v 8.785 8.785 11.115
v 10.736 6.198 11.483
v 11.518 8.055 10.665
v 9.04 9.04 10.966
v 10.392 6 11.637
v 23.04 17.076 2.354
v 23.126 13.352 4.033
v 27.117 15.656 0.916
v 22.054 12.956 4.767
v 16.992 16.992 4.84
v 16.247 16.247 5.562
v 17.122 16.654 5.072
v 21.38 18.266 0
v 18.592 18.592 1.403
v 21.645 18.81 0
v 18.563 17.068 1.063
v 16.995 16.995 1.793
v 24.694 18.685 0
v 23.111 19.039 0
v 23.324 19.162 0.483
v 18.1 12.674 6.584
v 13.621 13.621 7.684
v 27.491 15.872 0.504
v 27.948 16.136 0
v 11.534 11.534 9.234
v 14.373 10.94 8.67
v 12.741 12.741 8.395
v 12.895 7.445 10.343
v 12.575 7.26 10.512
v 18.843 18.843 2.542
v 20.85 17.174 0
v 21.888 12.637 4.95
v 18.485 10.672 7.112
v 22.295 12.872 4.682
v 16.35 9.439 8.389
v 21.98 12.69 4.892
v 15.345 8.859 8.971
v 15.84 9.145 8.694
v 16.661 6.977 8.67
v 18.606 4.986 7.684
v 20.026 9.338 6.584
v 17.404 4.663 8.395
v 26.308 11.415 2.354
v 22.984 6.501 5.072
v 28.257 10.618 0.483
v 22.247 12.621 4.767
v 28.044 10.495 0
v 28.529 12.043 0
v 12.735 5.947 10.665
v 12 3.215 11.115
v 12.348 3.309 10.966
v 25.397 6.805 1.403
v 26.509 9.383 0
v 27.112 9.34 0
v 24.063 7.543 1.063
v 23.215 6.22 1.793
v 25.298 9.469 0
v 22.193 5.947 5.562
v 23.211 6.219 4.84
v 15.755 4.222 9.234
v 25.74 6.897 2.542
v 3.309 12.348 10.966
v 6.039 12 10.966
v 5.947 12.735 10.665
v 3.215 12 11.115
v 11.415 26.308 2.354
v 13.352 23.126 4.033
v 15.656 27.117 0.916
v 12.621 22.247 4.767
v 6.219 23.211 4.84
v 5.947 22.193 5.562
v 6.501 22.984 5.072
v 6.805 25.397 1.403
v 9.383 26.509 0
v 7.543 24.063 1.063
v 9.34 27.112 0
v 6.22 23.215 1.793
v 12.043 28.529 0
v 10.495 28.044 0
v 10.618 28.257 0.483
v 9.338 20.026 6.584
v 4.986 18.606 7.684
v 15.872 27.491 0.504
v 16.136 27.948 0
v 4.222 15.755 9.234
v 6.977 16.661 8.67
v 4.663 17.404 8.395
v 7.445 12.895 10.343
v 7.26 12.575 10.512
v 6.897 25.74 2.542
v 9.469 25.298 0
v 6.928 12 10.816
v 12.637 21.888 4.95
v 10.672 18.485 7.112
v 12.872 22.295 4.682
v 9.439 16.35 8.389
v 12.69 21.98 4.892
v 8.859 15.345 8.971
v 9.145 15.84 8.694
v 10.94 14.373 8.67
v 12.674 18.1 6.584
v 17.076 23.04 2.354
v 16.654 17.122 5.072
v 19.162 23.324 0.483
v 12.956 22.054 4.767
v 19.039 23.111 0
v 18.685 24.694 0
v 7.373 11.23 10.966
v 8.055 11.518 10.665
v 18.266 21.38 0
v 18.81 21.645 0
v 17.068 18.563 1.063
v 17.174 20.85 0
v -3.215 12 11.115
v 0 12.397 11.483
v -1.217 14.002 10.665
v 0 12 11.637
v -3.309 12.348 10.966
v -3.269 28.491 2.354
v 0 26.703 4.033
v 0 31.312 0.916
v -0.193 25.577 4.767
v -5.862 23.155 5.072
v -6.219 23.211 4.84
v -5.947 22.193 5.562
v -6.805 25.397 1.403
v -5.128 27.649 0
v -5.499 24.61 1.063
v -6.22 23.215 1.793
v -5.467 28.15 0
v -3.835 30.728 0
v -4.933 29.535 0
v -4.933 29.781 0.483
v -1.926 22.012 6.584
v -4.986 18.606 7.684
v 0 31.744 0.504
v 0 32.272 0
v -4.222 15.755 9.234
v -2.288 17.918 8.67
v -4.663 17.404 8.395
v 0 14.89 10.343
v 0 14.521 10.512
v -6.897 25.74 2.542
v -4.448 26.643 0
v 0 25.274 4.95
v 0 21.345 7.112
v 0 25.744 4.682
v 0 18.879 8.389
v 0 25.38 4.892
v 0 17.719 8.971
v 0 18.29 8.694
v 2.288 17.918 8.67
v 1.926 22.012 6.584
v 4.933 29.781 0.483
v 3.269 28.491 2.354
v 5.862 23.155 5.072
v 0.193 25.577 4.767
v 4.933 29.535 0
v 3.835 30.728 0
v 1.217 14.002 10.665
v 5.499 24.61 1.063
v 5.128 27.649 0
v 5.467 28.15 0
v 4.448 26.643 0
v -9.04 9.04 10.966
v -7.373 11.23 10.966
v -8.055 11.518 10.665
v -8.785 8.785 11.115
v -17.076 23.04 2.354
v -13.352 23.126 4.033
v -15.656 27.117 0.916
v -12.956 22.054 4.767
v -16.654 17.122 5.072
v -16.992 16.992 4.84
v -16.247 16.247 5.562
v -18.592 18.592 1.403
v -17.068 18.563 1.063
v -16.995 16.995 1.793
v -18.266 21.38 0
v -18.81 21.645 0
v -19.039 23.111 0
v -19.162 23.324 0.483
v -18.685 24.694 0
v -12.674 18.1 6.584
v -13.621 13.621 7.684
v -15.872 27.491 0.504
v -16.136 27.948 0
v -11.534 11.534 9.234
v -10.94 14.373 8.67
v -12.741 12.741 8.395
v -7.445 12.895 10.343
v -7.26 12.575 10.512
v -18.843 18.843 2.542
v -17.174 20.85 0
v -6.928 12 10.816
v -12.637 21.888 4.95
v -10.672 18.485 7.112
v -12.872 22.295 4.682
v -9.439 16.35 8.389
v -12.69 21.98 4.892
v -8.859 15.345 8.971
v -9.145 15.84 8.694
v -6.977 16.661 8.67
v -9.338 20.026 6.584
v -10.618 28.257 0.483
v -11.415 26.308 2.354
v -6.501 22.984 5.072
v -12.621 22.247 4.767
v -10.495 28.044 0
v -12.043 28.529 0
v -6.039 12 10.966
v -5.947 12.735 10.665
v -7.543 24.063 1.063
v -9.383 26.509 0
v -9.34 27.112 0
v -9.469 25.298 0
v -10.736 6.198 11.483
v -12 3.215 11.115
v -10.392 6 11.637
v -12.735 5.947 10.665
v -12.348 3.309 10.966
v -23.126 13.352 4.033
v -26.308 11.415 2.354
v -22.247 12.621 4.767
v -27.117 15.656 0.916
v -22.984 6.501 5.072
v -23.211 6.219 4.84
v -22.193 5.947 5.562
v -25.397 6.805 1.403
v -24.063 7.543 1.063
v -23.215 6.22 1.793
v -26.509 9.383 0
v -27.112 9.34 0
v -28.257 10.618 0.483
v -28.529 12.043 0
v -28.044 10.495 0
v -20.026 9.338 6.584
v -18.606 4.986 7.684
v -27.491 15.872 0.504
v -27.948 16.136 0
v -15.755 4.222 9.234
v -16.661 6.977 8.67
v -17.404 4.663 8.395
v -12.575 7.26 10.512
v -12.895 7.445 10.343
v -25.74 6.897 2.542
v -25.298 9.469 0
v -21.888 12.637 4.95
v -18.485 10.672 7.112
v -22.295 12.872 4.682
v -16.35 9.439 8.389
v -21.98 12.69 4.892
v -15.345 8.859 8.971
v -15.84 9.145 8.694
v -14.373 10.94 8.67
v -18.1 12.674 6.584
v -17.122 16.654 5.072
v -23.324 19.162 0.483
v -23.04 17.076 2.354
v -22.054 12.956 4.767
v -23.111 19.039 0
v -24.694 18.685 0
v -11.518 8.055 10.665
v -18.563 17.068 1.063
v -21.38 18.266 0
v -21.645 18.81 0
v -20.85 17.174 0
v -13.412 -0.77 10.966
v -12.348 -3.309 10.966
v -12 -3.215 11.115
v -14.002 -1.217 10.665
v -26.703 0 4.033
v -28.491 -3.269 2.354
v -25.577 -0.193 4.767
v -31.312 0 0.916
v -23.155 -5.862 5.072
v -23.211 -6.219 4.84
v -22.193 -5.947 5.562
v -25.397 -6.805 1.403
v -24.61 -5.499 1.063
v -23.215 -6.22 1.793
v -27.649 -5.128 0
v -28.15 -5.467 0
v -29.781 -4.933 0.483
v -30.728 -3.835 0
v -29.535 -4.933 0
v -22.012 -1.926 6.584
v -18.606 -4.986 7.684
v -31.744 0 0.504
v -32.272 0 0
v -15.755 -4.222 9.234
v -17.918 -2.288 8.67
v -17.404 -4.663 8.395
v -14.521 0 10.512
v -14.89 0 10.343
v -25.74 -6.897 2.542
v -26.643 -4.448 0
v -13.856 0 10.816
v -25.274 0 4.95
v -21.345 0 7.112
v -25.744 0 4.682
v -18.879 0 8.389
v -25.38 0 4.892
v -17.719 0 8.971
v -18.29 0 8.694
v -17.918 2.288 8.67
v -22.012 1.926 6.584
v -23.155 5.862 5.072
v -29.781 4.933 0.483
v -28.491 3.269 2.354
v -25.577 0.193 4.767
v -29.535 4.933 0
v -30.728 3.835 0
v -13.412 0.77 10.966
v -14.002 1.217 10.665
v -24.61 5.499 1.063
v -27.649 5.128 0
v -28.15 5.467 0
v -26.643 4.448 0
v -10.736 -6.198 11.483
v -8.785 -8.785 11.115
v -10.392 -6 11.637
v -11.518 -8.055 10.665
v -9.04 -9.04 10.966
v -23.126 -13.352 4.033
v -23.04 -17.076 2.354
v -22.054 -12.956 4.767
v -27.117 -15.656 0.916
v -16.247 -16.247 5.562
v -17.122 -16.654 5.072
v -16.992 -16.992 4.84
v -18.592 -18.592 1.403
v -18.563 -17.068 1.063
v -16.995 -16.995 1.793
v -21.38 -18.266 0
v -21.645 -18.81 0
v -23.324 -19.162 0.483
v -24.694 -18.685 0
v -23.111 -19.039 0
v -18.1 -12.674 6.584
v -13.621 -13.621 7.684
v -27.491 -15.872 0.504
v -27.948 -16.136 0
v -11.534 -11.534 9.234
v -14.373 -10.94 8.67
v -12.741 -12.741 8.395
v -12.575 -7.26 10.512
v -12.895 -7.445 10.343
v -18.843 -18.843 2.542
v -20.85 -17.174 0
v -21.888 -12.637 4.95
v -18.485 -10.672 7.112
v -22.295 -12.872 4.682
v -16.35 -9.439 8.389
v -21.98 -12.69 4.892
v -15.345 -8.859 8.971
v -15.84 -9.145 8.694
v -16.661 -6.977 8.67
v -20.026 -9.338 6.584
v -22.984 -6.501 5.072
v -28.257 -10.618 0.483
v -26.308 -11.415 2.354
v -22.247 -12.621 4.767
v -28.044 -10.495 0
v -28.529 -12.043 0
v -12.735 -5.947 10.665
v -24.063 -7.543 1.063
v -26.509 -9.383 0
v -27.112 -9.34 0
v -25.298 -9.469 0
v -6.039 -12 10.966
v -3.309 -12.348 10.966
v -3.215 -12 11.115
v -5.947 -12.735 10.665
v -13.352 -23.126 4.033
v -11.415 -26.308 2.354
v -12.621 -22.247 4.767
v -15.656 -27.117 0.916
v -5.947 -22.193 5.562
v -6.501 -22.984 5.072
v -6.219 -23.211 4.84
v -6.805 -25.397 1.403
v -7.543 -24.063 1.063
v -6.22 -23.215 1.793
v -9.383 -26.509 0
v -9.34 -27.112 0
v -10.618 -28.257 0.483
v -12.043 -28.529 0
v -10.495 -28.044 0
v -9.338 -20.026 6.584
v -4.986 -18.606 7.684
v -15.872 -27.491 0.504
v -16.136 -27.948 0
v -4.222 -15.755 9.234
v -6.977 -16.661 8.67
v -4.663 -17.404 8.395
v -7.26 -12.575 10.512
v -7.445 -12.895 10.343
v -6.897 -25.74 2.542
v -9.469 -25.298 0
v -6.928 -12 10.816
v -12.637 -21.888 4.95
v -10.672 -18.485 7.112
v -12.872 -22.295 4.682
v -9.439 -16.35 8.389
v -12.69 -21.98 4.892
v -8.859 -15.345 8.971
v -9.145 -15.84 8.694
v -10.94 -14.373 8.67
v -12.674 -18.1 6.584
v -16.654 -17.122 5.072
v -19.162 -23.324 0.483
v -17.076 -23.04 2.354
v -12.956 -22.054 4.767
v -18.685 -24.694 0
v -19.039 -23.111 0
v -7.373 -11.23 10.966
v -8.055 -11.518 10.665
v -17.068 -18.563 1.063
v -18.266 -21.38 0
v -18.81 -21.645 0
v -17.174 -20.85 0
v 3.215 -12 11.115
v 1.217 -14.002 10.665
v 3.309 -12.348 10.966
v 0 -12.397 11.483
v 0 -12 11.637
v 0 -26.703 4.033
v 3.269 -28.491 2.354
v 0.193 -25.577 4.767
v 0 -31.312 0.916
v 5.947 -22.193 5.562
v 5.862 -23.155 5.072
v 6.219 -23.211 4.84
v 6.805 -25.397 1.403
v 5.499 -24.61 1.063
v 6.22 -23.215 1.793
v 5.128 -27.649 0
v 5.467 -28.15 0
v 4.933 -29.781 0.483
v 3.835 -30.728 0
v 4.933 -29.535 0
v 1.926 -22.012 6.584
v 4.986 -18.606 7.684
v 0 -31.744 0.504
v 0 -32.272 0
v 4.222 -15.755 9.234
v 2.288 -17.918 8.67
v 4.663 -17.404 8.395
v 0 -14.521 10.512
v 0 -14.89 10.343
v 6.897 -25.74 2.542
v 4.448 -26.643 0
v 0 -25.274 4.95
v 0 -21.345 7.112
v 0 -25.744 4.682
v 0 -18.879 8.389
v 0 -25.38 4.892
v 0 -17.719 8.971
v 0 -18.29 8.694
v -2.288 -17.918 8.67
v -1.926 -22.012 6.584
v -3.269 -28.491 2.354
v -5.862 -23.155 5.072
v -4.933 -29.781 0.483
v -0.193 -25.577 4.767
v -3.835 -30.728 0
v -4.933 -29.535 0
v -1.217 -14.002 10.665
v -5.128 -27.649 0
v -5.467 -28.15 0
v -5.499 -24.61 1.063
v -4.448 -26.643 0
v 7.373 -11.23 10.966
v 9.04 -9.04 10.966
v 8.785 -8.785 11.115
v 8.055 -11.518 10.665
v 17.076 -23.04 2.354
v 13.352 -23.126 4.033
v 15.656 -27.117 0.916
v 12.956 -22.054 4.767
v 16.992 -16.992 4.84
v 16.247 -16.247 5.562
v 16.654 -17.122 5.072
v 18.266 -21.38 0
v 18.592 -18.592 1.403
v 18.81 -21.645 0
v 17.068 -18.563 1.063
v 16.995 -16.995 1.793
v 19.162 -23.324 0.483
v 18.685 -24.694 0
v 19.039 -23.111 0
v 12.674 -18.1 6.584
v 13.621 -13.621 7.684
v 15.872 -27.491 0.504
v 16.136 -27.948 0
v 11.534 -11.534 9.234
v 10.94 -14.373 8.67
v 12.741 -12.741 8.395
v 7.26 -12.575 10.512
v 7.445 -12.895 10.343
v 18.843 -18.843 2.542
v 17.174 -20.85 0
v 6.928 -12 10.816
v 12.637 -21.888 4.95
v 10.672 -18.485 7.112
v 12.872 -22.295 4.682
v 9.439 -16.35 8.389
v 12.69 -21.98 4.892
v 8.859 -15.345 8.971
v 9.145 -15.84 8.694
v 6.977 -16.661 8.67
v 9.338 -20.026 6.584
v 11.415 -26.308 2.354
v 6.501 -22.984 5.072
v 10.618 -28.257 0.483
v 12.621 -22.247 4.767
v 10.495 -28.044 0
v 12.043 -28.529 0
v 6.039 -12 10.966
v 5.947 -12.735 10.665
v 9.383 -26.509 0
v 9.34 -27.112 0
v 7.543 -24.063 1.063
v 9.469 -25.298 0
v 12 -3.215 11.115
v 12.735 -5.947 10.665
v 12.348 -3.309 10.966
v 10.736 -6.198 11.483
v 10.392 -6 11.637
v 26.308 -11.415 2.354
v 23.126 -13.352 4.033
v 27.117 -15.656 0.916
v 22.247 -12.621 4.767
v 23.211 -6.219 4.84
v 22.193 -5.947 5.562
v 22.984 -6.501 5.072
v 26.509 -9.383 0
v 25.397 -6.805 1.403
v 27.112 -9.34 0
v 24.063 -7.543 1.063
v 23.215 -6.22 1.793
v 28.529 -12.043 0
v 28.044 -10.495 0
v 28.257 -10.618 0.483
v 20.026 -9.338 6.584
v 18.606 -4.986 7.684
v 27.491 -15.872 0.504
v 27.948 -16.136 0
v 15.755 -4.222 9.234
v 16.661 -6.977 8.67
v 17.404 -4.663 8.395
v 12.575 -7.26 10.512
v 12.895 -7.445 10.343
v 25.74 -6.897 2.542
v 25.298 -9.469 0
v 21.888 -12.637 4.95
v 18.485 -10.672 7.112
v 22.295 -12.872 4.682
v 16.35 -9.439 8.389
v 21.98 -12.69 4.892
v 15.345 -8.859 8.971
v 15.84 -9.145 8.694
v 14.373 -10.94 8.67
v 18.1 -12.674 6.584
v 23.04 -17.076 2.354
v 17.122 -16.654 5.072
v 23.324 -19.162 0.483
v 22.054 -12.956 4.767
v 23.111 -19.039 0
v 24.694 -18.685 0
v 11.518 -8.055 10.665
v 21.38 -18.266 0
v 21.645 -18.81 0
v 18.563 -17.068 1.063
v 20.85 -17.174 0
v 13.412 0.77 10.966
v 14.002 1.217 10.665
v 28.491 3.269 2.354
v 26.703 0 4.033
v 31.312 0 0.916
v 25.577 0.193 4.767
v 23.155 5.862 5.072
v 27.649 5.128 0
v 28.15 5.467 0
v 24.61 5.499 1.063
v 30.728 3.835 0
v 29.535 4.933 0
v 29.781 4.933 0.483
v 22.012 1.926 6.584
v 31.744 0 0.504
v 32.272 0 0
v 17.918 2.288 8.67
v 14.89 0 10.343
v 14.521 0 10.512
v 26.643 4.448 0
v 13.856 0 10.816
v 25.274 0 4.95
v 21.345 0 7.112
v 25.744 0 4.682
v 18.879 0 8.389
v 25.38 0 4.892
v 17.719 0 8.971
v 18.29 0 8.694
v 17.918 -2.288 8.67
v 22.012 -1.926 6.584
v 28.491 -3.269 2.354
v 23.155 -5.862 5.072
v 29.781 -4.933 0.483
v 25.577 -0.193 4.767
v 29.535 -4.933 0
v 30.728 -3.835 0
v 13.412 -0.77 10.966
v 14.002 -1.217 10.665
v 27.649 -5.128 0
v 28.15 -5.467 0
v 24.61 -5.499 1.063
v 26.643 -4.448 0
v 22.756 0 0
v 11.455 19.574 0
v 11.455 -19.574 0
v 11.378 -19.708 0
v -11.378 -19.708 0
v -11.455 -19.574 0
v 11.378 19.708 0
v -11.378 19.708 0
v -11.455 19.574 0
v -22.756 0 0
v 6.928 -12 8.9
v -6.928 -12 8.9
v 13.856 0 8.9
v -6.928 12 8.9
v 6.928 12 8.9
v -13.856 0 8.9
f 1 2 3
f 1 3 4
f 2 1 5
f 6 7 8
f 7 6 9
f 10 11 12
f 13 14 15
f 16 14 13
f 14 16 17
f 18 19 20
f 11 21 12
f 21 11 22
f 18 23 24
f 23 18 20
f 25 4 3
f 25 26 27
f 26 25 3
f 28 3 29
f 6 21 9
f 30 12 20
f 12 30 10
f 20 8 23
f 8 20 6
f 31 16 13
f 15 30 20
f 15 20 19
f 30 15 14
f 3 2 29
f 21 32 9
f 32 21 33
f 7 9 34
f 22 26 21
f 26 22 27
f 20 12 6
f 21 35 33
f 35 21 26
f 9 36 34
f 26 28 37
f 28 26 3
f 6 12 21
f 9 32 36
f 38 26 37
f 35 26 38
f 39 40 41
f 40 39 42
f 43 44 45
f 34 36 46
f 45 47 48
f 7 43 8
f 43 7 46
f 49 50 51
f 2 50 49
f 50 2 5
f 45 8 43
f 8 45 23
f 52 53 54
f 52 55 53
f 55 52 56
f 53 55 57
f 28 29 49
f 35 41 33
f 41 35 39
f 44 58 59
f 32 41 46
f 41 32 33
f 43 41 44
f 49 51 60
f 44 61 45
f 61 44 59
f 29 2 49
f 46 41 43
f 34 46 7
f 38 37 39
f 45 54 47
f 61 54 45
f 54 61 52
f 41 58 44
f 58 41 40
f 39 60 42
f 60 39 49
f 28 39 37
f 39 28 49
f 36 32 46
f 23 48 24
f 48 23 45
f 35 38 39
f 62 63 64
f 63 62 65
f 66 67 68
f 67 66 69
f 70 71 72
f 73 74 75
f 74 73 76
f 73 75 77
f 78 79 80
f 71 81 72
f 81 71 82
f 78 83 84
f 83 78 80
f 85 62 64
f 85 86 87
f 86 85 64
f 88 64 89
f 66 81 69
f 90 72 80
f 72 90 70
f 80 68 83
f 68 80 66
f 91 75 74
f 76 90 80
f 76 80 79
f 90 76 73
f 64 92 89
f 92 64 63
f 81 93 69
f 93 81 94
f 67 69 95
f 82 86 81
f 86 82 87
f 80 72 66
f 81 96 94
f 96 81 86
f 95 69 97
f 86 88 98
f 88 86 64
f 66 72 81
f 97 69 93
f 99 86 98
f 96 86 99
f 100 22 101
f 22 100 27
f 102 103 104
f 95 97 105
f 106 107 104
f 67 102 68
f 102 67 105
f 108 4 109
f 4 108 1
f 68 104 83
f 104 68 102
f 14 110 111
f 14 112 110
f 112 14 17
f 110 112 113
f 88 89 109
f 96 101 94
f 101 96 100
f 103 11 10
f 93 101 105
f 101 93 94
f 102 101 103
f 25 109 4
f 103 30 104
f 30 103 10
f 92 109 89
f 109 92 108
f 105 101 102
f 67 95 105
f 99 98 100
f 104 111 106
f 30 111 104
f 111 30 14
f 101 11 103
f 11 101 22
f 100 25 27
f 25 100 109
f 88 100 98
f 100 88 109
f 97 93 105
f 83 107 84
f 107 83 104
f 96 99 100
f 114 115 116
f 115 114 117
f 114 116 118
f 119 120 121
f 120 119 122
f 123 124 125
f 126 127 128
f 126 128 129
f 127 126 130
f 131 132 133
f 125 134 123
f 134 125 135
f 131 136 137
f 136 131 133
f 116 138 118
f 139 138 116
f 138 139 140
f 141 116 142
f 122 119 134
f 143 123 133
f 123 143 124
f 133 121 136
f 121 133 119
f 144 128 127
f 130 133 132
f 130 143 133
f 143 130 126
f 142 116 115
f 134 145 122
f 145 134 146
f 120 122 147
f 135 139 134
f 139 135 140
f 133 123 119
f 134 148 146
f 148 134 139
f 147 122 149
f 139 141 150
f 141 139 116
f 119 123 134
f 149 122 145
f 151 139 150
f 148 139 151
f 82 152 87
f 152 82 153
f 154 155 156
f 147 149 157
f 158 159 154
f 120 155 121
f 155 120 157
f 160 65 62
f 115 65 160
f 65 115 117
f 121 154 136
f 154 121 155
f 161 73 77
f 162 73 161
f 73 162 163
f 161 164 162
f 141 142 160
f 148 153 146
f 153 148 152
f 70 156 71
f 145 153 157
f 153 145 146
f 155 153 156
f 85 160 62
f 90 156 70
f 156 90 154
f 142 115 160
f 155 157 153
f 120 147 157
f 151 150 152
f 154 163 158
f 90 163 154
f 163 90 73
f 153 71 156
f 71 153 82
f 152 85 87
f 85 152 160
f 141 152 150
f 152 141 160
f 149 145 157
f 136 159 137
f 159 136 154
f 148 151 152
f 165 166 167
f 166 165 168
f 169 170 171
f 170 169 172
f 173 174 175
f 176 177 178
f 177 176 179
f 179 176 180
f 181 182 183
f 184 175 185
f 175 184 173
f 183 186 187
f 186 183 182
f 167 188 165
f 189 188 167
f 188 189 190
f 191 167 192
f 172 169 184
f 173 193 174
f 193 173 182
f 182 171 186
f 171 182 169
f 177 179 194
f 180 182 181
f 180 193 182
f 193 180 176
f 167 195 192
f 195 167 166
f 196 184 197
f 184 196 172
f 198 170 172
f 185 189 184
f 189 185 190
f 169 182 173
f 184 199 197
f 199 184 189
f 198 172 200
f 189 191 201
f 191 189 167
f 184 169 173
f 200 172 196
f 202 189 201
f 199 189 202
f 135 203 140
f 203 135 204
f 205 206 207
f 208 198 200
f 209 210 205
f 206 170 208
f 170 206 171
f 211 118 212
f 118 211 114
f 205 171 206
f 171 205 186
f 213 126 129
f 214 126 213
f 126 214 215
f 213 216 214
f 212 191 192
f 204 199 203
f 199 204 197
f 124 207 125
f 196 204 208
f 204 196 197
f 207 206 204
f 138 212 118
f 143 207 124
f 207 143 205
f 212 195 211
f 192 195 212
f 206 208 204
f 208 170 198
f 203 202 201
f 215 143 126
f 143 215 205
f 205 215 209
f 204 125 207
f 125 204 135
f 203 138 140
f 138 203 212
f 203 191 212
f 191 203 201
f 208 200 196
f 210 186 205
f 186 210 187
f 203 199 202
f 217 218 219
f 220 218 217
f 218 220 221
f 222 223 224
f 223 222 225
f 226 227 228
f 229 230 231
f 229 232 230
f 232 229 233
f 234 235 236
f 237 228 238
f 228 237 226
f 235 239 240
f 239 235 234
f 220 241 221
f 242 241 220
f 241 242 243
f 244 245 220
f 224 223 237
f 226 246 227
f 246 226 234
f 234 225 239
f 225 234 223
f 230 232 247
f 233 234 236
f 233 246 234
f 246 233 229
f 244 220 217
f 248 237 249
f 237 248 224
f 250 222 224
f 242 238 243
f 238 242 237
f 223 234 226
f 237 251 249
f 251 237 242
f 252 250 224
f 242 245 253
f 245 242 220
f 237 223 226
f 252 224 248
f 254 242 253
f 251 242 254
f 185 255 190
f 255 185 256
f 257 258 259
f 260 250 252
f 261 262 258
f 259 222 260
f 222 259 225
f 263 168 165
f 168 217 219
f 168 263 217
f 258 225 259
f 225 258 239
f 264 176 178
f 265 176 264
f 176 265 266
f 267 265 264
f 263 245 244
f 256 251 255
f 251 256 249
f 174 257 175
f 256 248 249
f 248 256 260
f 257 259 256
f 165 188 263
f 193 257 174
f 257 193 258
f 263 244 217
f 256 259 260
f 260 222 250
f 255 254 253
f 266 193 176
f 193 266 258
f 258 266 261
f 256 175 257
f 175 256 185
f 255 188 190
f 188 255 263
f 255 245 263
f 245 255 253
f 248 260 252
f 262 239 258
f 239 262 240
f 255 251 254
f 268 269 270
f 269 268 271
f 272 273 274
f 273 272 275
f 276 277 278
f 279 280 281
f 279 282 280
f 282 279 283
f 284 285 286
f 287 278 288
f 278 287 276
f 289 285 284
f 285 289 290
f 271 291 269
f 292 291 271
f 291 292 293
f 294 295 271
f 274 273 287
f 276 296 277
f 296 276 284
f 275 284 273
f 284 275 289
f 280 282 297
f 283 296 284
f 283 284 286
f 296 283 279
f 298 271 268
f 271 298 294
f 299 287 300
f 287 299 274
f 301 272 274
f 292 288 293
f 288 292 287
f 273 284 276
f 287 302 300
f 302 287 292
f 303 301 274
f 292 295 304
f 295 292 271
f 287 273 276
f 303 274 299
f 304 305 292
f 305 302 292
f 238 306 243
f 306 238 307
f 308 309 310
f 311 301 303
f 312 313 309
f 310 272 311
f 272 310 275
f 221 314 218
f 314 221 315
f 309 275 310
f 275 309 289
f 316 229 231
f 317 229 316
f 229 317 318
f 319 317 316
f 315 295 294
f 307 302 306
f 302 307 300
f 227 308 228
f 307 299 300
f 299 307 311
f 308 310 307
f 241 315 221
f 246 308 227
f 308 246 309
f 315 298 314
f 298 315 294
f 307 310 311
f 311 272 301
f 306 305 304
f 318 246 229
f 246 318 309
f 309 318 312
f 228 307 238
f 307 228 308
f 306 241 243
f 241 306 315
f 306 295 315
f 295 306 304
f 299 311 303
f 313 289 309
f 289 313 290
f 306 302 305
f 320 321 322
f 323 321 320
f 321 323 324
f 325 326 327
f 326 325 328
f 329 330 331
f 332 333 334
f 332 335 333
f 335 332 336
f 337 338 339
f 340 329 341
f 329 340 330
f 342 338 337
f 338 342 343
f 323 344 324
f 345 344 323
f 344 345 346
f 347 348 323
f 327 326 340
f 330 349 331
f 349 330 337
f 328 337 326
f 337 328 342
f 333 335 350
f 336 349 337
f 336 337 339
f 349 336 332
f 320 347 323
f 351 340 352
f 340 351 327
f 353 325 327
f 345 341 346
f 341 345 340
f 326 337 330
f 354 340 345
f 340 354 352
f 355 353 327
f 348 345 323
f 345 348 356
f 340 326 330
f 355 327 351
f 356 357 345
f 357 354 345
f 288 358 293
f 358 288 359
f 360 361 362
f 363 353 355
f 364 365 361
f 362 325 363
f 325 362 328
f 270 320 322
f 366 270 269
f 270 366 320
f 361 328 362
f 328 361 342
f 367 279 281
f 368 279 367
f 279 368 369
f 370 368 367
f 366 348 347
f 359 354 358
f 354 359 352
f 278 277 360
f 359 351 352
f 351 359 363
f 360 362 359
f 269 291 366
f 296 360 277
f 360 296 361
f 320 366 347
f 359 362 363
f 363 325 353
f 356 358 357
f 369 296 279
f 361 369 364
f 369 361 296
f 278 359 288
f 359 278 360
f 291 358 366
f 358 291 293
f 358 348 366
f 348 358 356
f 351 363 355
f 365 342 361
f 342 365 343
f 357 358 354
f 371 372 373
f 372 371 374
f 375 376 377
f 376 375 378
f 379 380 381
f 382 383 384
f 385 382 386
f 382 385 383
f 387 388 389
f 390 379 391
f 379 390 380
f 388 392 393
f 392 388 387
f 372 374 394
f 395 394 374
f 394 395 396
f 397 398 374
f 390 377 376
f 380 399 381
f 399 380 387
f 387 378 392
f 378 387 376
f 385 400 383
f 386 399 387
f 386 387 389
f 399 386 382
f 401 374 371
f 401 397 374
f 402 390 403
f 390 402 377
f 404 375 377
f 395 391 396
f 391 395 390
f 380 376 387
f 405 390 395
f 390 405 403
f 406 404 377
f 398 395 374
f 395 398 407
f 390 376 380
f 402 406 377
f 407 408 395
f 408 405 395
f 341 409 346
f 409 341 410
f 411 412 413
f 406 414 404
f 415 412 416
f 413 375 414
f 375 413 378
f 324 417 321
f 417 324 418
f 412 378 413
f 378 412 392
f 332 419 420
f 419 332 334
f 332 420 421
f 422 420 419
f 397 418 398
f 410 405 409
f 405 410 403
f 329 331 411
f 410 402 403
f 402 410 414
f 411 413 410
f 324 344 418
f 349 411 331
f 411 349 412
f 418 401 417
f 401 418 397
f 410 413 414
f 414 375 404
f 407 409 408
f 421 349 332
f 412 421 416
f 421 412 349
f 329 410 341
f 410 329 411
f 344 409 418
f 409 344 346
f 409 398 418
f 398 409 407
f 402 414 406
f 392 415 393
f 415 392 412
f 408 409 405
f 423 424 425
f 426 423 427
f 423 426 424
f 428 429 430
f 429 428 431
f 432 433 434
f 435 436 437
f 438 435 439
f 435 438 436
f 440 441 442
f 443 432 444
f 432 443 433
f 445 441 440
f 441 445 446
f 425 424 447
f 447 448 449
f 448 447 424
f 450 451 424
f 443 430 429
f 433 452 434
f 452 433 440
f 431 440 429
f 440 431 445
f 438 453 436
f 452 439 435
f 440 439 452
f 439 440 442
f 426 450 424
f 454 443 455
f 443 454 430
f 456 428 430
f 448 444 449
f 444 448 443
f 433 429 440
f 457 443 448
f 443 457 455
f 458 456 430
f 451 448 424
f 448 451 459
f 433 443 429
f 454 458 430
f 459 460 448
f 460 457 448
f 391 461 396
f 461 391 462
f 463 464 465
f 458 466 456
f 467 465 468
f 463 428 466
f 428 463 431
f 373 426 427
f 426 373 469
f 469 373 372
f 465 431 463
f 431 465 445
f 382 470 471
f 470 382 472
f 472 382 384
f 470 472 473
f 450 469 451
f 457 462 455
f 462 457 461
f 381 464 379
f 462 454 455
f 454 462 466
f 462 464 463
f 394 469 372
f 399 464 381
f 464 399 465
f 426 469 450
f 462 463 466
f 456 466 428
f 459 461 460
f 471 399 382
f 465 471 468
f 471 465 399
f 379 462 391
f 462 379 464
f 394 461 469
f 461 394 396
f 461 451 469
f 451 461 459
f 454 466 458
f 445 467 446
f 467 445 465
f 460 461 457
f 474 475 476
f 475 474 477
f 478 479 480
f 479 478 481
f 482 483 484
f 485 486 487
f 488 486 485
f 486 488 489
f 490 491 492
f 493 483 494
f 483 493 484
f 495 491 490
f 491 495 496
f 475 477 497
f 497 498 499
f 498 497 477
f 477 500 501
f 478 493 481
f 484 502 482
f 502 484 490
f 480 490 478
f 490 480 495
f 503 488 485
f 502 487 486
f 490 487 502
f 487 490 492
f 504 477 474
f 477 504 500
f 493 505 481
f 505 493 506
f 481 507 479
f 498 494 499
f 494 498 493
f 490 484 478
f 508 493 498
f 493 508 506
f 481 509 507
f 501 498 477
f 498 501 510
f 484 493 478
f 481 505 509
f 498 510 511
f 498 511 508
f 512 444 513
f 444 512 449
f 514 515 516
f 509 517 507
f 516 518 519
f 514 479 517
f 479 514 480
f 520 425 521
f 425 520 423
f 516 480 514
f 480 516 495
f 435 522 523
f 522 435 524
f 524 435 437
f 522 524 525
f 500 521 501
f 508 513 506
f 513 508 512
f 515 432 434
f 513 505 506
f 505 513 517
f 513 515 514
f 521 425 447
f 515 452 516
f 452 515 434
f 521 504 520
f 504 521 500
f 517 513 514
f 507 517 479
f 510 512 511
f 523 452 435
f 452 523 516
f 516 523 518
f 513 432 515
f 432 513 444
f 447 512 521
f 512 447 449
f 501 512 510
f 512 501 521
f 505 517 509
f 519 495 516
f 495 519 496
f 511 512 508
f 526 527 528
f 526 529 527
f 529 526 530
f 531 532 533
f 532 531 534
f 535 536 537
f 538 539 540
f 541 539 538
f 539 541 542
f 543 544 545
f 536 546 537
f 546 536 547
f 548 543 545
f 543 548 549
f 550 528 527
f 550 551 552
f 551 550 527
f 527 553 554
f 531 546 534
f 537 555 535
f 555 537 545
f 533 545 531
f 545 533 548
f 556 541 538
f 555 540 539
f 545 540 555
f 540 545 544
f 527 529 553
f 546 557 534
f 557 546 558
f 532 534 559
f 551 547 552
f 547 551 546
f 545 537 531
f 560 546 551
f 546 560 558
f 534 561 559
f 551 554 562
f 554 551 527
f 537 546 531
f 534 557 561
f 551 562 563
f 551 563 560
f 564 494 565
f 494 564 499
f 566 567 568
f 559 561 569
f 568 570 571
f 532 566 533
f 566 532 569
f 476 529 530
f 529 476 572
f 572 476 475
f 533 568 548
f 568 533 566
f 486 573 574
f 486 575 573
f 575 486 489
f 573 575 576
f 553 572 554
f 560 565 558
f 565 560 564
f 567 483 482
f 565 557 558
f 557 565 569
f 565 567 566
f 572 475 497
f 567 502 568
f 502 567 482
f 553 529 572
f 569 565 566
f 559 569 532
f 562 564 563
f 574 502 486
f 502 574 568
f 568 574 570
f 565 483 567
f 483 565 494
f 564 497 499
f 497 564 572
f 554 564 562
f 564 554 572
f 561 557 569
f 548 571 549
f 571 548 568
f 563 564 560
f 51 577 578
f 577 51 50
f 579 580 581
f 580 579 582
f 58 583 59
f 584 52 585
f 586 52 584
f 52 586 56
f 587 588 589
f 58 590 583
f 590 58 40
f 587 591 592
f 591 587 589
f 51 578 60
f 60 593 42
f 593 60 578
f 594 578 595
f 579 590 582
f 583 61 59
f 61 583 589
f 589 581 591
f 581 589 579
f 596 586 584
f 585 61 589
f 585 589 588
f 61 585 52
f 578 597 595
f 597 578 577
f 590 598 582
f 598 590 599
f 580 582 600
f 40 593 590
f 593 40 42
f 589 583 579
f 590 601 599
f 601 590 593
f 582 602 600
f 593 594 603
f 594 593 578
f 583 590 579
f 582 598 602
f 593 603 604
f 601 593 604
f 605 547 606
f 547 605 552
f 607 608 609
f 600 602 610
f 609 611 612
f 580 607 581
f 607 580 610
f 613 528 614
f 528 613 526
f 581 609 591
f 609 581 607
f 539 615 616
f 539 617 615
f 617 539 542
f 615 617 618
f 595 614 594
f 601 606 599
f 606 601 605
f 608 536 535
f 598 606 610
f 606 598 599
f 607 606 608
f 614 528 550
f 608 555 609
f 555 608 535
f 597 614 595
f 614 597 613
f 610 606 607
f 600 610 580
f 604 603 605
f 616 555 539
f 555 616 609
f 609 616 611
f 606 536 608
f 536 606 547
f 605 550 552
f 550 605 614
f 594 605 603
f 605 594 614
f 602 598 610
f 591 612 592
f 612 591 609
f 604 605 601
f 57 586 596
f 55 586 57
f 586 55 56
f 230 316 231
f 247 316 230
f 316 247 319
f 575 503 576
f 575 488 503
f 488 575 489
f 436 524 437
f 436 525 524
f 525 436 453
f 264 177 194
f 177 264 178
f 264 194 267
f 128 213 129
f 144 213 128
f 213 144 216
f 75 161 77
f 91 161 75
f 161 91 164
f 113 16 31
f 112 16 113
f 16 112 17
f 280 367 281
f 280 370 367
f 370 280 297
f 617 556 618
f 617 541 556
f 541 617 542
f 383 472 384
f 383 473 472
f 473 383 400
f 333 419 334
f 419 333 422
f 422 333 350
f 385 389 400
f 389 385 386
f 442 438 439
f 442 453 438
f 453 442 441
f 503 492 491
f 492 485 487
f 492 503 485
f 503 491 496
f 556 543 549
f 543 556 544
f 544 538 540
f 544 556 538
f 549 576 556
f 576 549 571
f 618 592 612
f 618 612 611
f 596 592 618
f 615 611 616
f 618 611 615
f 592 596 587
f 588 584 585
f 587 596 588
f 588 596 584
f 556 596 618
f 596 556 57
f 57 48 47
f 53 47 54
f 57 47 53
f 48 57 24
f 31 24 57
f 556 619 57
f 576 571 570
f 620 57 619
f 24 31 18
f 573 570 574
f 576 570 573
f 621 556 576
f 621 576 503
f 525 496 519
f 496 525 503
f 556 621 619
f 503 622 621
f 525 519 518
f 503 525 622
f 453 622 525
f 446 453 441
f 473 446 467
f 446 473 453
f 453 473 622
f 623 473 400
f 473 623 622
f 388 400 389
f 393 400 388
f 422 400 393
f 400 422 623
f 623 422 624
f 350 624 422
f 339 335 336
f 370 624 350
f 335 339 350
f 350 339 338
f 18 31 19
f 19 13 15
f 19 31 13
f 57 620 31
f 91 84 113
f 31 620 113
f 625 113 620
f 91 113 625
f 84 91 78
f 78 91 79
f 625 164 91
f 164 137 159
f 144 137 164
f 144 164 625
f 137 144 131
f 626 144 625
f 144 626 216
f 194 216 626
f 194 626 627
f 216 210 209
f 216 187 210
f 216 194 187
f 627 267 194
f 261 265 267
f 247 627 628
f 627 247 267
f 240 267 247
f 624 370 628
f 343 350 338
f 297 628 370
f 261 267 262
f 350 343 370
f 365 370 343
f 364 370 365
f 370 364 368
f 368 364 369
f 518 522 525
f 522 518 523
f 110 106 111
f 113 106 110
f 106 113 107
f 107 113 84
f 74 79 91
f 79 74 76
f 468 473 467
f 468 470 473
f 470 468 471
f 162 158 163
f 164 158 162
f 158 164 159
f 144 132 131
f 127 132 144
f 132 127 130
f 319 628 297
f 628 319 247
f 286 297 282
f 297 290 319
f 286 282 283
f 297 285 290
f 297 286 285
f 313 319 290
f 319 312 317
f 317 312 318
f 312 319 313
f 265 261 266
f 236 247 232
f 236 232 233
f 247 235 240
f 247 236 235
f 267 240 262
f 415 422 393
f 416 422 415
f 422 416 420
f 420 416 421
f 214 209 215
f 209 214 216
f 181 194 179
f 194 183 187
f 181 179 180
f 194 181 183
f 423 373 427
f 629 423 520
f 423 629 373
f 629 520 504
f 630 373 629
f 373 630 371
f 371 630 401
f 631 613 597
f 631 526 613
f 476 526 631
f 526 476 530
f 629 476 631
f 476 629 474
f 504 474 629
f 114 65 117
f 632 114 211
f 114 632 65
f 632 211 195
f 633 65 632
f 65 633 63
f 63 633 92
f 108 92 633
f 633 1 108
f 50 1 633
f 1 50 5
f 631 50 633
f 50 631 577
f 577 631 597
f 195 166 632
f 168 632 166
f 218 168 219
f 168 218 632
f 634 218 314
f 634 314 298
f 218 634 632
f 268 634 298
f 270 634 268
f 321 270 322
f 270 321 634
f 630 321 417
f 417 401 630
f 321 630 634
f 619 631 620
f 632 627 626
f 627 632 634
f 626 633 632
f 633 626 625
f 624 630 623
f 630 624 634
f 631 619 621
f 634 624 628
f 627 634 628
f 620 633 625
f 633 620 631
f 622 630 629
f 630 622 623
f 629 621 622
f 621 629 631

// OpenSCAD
// [FL_INDEX: keywords="openscad, 3d_parametric, Customizable_Rosette, csg_solid" | COT="Parametric OpenSCAD design from 3DCodeverse"]
// Title: Customizable Rosette

// Rosette
// (c) 2013 Wouter Robers

HoleDiameter=24;
NumberOfSidesForHole=6; //[4:60]
NumberOfLeaves=12; //[3:30]
LeafLength=20;  //[10:40]
LeafWidth=15; //[2:20]
LeafThickness=3; //[1:10]
LeafPointyness=4; //[0:10]
HalfOrFull="Full"; //[Half,Full]
// Polygons
$fn=15; //[15:Rough,30:Medium,60:Fine]

difference(){
union(){
translate([0,0,-0.1]) cylinder(r1=28,r2=0,h=17,$fn=12);
translate([0,0,15]) for(i=[1:NumberOfLeaves]){
rotate([0,27,i*360/NumberOfLeaves])
intersection(){
scale([LeafLength,LeafWidth,LeafThickness]) translate([1,-LeafPointyness/10,0])sphere(1);
scale([LeafLength,LeafWidth,LeafThickness]) translate([1,LeafPointyness/10,0])sphere(1);
}
}

}
// Cutting floor
translate([0,0,-100]) cube(200,center=true);
//Cutting half
if(HalfOrFull=="Half"){
translate([0,-50,0]) cube(100,center=true);}
// Hexagonal hole
translate([0,0,-1]) cylinder(r=HoleDiameter/2/cos(180/NumberOfSidesForHole),h=70,$fn=NumberOfSidesForHole);
translate([0,0,-0.1]) cylinder(r1=12/(0.5*sqrt(3))+9,r2=HoleDiameter/2/sin(60),h=9,$fn=NumberOfSidesForHole);
}
